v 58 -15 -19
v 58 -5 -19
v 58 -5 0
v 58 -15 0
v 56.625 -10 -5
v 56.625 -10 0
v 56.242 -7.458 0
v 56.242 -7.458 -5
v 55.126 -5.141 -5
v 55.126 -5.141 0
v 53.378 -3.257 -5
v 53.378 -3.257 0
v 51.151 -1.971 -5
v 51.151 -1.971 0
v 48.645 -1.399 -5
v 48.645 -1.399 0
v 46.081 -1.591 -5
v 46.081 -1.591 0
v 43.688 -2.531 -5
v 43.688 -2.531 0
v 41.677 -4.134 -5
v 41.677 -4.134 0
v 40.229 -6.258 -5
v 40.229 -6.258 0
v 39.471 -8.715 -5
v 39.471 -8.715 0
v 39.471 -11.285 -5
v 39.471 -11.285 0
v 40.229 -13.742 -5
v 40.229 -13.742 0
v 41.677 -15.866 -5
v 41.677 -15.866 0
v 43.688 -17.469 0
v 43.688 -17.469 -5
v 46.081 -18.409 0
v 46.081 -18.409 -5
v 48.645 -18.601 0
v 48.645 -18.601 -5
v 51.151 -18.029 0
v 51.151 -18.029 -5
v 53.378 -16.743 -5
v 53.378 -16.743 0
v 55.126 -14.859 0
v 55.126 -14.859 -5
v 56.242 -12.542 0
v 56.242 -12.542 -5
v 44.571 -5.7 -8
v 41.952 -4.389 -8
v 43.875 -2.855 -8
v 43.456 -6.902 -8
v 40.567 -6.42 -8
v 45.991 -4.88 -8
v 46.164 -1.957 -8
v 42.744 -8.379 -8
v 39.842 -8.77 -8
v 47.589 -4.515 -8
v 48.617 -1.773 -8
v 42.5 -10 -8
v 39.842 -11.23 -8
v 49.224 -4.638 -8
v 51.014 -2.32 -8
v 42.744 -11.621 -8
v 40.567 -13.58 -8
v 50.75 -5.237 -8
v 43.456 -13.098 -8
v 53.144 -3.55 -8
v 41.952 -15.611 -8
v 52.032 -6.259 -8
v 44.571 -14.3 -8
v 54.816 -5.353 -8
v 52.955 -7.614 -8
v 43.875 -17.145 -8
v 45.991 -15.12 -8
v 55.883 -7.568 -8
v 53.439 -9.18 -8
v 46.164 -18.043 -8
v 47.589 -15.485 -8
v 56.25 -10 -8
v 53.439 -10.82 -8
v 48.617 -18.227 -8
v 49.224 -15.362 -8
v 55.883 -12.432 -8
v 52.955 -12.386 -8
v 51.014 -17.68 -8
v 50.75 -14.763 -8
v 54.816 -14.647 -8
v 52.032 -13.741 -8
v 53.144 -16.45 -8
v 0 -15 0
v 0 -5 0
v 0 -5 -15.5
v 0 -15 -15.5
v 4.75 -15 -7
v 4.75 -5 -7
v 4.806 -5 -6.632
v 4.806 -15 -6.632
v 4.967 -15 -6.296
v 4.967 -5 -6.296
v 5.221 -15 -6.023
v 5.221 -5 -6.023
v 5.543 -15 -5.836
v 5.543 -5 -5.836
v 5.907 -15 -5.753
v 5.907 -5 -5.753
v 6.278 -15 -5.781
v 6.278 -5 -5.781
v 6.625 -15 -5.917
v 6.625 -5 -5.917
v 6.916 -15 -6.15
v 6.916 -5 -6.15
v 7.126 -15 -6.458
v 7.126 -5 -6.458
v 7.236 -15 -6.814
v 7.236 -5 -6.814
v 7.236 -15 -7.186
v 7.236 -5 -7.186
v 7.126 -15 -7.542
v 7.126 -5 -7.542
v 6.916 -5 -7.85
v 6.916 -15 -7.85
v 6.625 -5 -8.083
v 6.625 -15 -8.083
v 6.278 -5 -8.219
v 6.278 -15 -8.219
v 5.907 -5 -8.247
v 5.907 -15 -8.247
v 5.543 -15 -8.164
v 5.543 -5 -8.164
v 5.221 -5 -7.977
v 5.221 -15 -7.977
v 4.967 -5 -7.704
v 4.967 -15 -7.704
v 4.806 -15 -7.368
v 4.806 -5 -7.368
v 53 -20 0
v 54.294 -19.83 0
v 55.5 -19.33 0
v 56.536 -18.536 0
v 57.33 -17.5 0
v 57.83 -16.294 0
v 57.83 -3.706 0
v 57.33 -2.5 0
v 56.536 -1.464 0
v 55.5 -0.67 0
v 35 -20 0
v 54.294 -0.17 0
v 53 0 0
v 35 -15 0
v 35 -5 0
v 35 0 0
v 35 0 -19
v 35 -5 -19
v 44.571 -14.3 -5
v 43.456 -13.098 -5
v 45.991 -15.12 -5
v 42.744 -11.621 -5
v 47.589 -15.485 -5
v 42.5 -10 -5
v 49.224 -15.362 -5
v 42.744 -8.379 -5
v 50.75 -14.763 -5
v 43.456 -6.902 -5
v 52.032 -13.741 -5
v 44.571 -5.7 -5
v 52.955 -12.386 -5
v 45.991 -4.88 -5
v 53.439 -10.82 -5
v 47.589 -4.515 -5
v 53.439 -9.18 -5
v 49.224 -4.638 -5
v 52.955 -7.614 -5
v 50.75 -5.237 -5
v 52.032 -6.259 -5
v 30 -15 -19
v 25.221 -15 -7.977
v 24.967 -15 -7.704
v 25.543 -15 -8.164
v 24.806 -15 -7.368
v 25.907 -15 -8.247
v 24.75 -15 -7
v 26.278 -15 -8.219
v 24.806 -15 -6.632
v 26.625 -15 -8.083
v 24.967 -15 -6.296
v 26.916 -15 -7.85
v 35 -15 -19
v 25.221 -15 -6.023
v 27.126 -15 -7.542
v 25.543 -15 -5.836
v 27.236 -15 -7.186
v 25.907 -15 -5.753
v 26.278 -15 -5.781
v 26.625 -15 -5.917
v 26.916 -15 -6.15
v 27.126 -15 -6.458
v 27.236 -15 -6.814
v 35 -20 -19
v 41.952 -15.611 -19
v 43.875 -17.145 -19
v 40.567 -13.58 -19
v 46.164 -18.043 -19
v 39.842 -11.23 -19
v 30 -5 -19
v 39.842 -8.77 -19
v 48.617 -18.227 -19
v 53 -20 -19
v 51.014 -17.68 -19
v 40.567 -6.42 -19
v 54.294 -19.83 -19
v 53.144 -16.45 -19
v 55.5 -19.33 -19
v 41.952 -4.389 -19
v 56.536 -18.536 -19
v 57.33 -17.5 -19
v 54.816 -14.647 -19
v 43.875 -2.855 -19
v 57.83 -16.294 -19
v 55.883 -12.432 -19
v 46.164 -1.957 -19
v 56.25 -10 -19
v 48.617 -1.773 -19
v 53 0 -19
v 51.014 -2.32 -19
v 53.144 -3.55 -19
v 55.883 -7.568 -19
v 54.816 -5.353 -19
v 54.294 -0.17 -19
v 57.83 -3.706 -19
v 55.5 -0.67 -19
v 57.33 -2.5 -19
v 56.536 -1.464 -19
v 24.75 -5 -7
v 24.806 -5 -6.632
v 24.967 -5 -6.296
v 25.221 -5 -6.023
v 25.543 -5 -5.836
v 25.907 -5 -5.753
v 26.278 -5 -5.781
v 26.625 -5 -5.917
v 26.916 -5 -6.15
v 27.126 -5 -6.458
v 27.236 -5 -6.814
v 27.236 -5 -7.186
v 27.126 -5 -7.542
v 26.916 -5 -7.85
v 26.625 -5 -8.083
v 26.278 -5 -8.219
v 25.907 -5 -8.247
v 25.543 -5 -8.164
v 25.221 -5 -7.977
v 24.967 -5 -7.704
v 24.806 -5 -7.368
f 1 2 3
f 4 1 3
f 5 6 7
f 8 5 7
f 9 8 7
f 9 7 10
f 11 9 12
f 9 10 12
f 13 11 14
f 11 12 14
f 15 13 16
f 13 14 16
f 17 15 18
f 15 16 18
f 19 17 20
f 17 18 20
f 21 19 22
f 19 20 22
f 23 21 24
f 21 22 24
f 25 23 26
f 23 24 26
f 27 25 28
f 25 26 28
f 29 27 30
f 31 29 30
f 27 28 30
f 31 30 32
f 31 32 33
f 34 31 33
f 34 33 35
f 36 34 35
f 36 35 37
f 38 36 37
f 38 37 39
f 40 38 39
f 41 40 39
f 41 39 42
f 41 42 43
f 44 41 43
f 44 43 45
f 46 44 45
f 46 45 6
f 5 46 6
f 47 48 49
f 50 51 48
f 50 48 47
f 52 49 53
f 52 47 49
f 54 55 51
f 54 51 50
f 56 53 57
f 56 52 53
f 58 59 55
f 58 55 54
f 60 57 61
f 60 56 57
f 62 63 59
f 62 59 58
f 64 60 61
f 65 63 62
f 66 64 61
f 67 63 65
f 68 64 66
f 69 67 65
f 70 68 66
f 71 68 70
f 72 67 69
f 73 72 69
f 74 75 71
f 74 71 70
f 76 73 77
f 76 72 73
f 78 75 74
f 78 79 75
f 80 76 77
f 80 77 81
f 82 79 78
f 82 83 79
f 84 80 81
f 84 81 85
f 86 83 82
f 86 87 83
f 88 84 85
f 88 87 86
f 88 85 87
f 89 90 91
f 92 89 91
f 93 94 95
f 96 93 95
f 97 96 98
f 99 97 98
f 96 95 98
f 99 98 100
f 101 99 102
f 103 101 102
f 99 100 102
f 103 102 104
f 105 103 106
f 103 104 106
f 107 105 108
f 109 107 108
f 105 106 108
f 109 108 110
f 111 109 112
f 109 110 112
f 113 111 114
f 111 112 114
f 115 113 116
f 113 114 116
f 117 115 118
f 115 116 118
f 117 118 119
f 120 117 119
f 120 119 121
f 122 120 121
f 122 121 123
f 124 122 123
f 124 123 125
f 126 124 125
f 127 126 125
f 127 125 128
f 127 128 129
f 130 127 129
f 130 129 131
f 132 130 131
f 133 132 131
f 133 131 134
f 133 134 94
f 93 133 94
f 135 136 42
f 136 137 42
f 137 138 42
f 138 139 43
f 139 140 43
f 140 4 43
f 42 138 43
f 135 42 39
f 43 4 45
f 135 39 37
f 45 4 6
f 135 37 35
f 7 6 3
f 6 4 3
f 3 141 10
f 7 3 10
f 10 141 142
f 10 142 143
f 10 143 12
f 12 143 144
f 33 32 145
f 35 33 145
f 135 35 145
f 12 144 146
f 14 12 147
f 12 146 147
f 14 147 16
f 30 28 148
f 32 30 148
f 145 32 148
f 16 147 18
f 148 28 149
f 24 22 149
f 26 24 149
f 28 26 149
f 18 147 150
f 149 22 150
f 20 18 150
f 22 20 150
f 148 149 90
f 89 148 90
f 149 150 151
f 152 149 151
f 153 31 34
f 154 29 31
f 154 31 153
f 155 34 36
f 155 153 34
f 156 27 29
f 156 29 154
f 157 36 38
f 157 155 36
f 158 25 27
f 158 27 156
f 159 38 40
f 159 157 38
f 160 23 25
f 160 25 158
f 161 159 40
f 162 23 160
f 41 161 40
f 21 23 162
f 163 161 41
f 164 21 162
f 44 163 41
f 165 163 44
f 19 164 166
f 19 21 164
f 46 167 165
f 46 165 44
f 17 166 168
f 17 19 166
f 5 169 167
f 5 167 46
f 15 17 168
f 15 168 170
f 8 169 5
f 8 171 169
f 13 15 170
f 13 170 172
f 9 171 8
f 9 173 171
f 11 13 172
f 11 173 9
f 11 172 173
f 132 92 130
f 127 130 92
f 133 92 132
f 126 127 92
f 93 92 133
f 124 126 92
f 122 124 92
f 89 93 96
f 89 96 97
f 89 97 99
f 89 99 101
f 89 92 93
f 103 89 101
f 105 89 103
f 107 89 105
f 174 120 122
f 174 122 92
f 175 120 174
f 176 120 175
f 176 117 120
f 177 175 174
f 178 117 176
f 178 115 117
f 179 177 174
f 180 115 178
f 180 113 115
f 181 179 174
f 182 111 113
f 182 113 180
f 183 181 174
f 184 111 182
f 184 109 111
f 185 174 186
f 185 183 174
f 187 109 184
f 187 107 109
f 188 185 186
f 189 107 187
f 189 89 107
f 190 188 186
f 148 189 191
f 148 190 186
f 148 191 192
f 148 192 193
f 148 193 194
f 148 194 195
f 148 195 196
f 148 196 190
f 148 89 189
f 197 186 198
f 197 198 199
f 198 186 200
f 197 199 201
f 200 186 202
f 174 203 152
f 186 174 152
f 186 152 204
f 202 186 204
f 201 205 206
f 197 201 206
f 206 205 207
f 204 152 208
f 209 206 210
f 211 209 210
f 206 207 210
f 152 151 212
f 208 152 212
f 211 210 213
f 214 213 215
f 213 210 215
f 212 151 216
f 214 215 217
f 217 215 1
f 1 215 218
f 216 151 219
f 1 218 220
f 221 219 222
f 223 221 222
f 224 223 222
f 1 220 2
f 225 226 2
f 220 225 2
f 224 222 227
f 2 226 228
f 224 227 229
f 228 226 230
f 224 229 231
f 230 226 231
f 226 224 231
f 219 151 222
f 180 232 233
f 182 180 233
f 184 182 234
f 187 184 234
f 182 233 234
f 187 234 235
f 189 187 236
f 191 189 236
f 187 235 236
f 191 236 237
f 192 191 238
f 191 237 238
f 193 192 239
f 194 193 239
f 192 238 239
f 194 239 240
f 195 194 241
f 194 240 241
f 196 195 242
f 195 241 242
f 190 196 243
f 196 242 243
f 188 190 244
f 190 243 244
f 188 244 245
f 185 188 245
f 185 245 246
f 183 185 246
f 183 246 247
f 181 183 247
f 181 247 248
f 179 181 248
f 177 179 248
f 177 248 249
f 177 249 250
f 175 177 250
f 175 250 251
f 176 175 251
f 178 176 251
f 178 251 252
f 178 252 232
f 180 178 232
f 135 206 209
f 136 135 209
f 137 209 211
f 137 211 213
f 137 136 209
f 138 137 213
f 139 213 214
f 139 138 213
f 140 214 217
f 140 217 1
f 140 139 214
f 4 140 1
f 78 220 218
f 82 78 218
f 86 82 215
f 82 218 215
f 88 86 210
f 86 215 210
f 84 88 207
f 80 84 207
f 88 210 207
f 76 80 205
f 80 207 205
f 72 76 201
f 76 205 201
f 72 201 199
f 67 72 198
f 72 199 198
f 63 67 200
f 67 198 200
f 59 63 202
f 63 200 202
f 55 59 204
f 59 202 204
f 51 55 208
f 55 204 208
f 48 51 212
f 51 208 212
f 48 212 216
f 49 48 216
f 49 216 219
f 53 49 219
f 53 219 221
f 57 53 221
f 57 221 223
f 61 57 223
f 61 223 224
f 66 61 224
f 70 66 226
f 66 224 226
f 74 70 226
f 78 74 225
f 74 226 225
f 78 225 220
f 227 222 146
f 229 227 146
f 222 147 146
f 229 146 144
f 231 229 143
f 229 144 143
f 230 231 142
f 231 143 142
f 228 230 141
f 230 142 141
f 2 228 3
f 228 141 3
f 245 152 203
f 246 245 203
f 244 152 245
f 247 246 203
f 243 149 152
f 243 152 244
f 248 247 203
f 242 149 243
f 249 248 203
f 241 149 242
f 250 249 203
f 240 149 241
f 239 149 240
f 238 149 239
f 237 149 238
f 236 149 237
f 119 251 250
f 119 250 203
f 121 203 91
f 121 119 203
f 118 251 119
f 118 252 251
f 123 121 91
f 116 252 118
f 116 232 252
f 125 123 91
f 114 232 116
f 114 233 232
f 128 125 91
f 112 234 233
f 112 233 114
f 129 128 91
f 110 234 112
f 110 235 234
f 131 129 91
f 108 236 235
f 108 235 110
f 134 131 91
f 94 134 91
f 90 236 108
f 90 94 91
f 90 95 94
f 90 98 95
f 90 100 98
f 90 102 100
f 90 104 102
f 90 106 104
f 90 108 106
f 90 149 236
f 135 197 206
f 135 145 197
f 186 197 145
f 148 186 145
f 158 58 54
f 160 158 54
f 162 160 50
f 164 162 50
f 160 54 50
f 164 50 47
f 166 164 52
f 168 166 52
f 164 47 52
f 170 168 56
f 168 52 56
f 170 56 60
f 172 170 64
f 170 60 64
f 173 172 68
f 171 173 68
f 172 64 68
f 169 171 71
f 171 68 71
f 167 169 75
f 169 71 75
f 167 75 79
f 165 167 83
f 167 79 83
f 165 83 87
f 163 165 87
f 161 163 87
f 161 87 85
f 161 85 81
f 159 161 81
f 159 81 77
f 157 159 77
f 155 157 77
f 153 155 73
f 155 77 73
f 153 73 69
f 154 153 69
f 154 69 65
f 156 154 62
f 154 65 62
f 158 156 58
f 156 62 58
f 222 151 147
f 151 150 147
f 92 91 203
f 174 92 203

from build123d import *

# Parameters (mm, degrees)
F1_DEPTH       = 20
F3_D           = 11
F3_CBORE_D     = 17.25
F3_CBORE_DEPTH = 5
F4_R           = 8.25
F5_DEPTH       = 11
F7_DEPTH       = 5
F9_DEPTH       = 5
F11_D          = 2.5
F12_R          = 5


with BuildPart() as f1:
    # F0 (on Front) → F1 (new body)
    with BuildSketch(Plane.XZ):
        Polygon((58, 0), (0, 0), (0, -15.5), (30, -19), (58, -19), align=None)
    extrude(amount=F1_DEPTH)

    # F3 (through all)
    with Locations(Plane.XY):
        with Locations((48, -10)):
            CounterBoreHole(F3_D / 2, F3_CBORE_D / 2, F3_CBORE_DEPTH)

    # F4 (on face) → F5 (cut)
    with BuildSketch(Plane(origin=(0, 0, -19), x_dir=(1, 0, 0), z_dir=(0, 0, -1))):
        with Locations((48, 10)):
            Circle(F4_R)
    extrude(amount=-F5_DEPTH, mode=Mode.SUBTRACT)

    # F6 (on face) → F7 (cut)
    with BuildSketch(Plane.XZ.offset(20)):
        Polygon((35, -19), (35, 0), (0, 0), (0, -15.5), (30, -19), align=None)
    extrude(amount=-F7_DEPTH, mode=Mode.SUBTRACT)

    # F8 (on face) → F9 (cut)
    with BuildSketch(Plane(origin=(0, 0, 0), x_dir=(-1, 0, 0), z_dir=(0, 1, 0))):
        Polygon((0, 0), (-35, 0), (-35, -19), (-30, -19), (0, -15.5), align=None)
    extrude(amount=-F9_DEPTH, mode=Mode.SUBTRACT)

    # F11 (through all)
    with Locations(Plane.XZ.offset(15)):
        with Locations((6, -7), (26, -7)):
            Hole(F11_D / 2)

    # F12
    f12_edges = [f1.edges().sort_by_distance(p)[0] for p in [
        (58, -20, -9.5),
        (58, 0, -9.5),
    ]]
    fillet(f12_edges, radius=F12_R)


solid = f1.part
